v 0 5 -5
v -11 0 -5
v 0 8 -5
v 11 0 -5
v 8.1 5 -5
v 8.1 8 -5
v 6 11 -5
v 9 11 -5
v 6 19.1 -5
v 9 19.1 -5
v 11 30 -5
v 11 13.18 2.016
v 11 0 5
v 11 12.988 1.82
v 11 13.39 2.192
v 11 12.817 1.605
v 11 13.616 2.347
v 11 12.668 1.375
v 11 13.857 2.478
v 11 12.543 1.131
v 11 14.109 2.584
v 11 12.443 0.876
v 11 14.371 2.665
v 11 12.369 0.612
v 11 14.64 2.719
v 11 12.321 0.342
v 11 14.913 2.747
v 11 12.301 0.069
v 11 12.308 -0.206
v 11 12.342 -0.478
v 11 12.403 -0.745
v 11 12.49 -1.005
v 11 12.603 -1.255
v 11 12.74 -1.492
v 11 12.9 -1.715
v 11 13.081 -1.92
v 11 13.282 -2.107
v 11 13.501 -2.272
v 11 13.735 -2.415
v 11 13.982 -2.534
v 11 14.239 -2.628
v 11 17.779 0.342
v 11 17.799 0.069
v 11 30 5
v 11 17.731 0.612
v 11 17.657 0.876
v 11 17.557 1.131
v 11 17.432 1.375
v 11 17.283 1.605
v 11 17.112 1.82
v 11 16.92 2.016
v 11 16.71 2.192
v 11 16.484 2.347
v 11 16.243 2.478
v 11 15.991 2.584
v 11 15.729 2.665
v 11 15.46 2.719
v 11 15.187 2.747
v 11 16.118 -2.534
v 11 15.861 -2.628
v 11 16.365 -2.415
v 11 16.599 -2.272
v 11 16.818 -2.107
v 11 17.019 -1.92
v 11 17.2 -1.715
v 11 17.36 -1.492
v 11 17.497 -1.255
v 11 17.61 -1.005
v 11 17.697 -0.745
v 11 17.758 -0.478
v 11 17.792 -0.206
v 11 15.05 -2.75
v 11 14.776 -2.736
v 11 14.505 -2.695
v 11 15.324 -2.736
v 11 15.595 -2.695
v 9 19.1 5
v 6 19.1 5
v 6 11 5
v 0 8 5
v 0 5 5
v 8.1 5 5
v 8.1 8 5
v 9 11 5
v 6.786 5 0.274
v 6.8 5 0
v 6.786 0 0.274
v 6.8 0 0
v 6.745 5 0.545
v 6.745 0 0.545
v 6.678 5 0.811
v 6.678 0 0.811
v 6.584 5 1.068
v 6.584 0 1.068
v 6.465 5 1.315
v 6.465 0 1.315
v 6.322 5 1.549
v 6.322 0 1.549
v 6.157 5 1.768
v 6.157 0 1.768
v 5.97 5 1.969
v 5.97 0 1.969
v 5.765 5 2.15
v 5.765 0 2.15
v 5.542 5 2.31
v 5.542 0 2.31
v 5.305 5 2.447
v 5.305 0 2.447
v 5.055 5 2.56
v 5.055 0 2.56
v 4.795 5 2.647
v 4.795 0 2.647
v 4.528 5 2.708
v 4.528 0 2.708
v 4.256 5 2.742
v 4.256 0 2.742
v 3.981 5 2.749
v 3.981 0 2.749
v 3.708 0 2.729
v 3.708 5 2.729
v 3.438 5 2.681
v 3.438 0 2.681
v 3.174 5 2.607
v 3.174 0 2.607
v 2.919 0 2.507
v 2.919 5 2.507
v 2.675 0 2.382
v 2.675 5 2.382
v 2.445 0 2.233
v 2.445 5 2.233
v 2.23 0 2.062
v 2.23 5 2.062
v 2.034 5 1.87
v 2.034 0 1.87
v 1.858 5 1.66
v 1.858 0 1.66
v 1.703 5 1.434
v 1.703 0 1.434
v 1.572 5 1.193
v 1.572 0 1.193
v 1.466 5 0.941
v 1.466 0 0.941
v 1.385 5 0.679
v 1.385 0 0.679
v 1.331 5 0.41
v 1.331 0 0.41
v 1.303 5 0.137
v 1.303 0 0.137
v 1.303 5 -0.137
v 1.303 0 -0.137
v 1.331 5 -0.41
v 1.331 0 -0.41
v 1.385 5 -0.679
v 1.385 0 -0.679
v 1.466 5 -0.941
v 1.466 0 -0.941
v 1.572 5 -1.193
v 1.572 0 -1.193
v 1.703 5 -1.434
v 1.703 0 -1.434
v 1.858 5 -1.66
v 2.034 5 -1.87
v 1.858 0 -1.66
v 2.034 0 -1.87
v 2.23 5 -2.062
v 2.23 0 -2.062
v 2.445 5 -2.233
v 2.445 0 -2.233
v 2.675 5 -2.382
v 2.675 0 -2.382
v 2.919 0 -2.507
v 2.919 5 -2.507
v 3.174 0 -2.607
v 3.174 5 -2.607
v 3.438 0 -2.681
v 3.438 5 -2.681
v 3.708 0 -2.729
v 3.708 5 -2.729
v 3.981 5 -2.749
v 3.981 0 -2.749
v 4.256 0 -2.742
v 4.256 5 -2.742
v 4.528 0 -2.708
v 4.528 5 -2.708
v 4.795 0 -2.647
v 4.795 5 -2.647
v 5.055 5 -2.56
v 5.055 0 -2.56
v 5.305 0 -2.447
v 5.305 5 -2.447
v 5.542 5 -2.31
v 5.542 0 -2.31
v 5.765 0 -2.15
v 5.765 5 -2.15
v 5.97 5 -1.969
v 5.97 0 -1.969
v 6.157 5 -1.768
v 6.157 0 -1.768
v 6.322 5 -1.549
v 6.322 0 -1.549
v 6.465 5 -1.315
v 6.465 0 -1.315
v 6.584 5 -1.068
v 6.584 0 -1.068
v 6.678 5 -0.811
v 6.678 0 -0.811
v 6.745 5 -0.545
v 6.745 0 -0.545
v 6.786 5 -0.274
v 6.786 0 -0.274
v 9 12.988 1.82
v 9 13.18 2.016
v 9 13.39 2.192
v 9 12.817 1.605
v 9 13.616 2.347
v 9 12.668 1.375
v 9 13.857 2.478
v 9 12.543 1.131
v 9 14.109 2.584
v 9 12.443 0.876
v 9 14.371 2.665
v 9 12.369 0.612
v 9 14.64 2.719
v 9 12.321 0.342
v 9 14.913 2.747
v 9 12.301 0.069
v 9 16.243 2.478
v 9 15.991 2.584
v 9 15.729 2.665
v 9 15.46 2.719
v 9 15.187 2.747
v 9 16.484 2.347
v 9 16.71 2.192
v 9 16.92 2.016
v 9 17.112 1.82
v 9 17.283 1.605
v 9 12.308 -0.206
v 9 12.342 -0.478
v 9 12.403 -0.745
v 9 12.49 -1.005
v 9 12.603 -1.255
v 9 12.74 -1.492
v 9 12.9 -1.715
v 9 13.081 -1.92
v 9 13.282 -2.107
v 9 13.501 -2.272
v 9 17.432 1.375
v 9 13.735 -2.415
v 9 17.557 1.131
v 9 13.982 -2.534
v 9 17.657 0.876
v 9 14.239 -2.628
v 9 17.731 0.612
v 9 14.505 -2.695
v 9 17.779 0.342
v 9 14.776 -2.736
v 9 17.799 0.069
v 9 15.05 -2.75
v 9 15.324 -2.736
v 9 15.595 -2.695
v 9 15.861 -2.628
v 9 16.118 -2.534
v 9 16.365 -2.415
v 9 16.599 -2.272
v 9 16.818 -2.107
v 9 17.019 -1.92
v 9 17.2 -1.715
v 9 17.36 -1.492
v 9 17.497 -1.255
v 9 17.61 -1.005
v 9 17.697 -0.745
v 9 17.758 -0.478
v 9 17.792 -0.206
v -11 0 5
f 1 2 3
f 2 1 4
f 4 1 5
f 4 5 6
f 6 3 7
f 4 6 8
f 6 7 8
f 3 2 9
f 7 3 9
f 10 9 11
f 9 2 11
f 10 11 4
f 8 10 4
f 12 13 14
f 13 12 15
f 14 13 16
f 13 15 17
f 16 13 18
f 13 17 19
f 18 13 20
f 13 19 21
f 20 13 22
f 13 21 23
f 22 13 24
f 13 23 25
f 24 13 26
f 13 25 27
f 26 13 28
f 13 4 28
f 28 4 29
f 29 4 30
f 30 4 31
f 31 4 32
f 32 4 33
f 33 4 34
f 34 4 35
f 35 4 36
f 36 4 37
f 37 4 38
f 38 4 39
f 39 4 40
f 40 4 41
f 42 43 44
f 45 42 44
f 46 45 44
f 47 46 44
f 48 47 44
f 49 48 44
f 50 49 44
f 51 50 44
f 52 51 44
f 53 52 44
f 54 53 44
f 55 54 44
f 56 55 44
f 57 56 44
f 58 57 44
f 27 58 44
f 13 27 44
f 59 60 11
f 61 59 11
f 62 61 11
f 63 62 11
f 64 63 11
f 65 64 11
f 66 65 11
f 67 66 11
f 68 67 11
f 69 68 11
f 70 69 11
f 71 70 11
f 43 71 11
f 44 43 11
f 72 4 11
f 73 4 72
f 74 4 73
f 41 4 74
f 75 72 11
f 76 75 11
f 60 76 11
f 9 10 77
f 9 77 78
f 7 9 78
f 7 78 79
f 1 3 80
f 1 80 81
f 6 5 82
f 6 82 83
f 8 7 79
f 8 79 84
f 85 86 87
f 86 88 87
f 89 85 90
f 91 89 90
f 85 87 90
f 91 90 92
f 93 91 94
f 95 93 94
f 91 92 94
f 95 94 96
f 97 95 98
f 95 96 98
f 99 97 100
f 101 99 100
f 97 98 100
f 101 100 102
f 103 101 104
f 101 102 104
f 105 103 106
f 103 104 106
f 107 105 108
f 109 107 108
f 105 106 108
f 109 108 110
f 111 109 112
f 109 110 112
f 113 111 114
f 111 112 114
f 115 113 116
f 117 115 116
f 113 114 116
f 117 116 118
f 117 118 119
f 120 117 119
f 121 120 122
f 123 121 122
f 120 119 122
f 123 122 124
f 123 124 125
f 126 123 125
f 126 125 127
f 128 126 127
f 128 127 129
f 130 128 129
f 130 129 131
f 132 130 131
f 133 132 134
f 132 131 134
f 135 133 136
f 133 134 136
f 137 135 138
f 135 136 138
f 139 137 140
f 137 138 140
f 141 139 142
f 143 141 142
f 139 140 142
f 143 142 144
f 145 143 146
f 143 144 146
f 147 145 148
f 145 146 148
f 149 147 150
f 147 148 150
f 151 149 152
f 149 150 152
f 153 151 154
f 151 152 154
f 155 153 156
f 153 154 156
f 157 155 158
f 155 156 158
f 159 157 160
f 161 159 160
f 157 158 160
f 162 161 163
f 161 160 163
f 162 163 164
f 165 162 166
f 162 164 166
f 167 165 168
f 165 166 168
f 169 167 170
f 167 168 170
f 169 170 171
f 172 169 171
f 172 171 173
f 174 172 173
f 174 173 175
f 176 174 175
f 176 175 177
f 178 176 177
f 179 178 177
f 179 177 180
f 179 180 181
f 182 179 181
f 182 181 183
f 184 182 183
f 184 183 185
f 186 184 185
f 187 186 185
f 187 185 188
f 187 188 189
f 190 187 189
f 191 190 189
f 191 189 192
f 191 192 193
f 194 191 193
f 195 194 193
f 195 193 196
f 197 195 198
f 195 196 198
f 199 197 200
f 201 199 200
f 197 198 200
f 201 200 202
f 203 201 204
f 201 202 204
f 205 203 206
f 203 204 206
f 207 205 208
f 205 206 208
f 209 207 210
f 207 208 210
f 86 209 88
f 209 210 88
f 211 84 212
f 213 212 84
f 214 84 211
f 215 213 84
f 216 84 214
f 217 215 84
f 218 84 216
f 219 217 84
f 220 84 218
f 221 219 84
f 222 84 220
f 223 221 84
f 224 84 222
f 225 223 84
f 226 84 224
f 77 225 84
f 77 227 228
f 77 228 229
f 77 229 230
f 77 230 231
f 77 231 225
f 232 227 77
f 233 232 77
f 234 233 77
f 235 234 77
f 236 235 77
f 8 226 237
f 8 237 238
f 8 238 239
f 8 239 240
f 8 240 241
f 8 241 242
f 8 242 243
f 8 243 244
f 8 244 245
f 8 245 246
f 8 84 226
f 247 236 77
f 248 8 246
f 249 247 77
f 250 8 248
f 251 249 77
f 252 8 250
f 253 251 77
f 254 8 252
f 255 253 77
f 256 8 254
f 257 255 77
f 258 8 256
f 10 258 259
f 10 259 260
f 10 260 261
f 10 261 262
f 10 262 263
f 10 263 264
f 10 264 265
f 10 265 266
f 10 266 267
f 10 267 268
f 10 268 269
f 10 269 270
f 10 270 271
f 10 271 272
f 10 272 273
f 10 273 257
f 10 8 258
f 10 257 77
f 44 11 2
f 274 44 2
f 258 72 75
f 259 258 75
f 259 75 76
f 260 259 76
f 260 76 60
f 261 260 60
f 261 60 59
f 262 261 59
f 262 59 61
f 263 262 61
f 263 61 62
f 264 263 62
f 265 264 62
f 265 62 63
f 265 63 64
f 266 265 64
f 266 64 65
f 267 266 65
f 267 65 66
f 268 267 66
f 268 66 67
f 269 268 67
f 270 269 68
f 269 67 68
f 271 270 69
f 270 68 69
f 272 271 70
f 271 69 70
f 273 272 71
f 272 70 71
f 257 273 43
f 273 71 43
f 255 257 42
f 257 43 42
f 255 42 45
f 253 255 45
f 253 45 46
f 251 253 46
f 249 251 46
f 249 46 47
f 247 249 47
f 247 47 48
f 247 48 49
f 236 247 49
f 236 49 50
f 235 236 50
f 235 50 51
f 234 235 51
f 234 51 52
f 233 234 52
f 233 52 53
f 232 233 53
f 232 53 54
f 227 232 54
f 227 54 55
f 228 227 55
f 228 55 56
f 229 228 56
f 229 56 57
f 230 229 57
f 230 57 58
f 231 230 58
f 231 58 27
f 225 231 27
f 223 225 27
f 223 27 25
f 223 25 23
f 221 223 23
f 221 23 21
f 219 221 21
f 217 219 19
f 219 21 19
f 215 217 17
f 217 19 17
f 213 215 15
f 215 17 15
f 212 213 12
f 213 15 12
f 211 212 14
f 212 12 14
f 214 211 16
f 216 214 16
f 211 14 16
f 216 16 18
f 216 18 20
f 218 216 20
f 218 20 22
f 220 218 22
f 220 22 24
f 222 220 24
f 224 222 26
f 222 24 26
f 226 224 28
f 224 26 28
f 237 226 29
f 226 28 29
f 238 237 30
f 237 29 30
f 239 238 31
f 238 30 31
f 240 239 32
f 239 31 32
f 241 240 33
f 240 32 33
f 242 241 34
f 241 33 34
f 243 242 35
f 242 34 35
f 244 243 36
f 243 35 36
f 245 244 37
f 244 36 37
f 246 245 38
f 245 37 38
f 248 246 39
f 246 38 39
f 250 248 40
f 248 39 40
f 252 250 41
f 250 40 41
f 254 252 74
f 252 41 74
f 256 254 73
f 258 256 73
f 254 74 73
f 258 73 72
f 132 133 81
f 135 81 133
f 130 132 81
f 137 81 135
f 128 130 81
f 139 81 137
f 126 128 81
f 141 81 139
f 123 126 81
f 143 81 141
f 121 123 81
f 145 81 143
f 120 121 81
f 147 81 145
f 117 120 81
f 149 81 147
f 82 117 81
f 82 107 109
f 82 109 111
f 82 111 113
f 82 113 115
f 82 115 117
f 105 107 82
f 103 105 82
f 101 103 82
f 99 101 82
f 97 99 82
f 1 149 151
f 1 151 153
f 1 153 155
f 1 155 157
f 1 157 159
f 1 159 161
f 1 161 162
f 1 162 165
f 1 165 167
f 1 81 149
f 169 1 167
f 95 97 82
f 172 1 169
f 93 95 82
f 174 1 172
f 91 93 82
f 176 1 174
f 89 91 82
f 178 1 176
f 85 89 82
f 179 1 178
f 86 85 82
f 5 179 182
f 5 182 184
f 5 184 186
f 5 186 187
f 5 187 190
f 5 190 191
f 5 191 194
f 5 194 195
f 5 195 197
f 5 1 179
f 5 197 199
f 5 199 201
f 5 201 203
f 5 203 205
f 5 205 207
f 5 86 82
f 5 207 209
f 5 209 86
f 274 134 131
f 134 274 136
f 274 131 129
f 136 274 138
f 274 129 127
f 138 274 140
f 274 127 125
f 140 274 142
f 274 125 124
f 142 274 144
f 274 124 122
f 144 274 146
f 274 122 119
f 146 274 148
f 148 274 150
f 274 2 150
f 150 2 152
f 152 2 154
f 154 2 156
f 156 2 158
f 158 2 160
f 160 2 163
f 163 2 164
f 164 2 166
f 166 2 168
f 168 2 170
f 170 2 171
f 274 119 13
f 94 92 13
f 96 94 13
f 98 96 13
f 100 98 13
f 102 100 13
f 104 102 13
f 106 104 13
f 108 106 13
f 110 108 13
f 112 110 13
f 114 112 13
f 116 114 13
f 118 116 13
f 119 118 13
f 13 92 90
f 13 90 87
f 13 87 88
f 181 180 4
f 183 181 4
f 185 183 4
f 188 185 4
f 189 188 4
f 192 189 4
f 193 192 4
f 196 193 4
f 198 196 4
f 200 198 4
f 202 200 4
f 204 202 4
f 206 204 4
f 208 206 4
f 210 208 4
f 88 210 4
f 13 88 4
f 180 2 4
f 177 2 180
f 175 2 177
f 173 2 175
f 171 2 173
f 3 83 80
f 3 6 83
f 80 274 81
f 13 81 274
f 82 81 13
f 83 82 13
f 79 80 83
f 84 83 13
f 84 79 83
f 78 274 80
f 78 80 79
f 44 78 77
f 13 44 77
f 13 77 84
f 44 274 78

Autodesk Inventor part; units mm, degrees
ref_plane "YZ Plane" through (0, 0, 0) normal (1, 0, 0) x (0, 1, 0)
ref_plane "XZ Plane" through (0, 0, 0) normal (0, 1, 0) x (-1, 0, 0)
ref_plane "XY Plane" through (0, 0, 0) normal (0, 0, 1) x (1, 0, 0)
sketch "Sketch1" plane through (0, 0, 0) normal (0, 0, 1) x (1, 0, 0)
  line L0 (-11, 0) -> (11, 0)
  line L1 (11, 0) -> (11, 30)
  line L2 (11, 30) -> (-11, 0)
  point P0 (0, 0)
  point P1 (0, 0)
  dimension "d0" = 22
  dimension "d1" = 30
extrude "Extrusion1" add sketch "Sketch1" along normal mid plane 10
sketch "Sketch2" plane through (0, 0, 0) normal (0, 0, 1) x (1, 0, 0)
  line L0 (11, 30) -> (11, 0) construction
  line L1 (11, 0) -> (-11, 0) construction
  line L2 (-11, 0) -> (11, 30) construction
  line L3 (8.1, 8) -> (0, 8)
  line L4 (0, 8) -> (0, 5)
  line L5 (0, 5) -> (8.1, 5)
  line L6 (8.1, 5) -> (8.1, 8)
  line L7 (6, 11) -> (9, 11)
  line L8 (9, 11) -> (9, 19.1)
  line L9 (9, 19.1) -> (6, 19.1)
  line L10 (6, 19.1) -> (6, 11)
  point P0 (0, 0)
  point P1 (0, 6.5)
  point P2 (0, 0)
  point P3 (11, 15)
  dimension "d4" = 8.1
  dimension "d5" = 5
  dimension "d6" = 3
  dimension "d7" = 3
  dimension "d8" = 8.1
  dimension "d9" = 2
  dimension "d10" = 3
extrude "Extrusion2" cut sketch "Sketch2" along normal through all both and the other way through all
sketch "Sketch3" plane through (11, 0, 5) normal (1, 0, 0) x (0, 0, -1)
  line L0 (10, 19.1) -> (10, 11) construction
  line L1 (10, 19.1) -> (0, 19.1) construction
  line L2 (0, 11) -> (0, 19.1) construction
  line L3 (10, 11) -> (0, 11) construction
  line L4 (10, 19.1) -> (0, 19.1) construction
  line L5 (5, 19.1) -> (5, 11) construction
  line L6 (0, 15.05) -> (10, 15.05) construction
  line L7 (10, 19.1) -> (10, 11) construction
  circle A0 centre (5, 15.05) radius 2.75
  point P0 (5, 0)
  dimension "d13" = 5.5
extrude "Extrusion3" cut sketch "Sketch3" against normal up to surface (5 mm away)
sketch "Sketch4" plane through (-11, 0, 5) normal (0, -1, 0) x (1, 0, 0)
  line L0 (19.1, -10) -> (11, -10) construction
  line L1 (19.1, -10) -> (19.1, 0) construction
  line L2 (11, 0) -> (19.1, 0) construction
  line L3 (11, 0) -> (11, -10) construction
  line L4 (19.1, 0) -> (11, 0) construction
  line L5 (15.05, 0) -> (15.05, -10) construction
  line L6 (19.1, -10) -> (11, -10) construction
  line L7 (11, -5) -> (19.1, -5) construction
  circle A0 centre (15.05, -5) radius 2.75
  dimension "d16" = 5.5
extrude "Extrusion4" cut sketch "Sketch4" against normal up to surface (8 mm away)
properties part number "ligamento_obj4"
